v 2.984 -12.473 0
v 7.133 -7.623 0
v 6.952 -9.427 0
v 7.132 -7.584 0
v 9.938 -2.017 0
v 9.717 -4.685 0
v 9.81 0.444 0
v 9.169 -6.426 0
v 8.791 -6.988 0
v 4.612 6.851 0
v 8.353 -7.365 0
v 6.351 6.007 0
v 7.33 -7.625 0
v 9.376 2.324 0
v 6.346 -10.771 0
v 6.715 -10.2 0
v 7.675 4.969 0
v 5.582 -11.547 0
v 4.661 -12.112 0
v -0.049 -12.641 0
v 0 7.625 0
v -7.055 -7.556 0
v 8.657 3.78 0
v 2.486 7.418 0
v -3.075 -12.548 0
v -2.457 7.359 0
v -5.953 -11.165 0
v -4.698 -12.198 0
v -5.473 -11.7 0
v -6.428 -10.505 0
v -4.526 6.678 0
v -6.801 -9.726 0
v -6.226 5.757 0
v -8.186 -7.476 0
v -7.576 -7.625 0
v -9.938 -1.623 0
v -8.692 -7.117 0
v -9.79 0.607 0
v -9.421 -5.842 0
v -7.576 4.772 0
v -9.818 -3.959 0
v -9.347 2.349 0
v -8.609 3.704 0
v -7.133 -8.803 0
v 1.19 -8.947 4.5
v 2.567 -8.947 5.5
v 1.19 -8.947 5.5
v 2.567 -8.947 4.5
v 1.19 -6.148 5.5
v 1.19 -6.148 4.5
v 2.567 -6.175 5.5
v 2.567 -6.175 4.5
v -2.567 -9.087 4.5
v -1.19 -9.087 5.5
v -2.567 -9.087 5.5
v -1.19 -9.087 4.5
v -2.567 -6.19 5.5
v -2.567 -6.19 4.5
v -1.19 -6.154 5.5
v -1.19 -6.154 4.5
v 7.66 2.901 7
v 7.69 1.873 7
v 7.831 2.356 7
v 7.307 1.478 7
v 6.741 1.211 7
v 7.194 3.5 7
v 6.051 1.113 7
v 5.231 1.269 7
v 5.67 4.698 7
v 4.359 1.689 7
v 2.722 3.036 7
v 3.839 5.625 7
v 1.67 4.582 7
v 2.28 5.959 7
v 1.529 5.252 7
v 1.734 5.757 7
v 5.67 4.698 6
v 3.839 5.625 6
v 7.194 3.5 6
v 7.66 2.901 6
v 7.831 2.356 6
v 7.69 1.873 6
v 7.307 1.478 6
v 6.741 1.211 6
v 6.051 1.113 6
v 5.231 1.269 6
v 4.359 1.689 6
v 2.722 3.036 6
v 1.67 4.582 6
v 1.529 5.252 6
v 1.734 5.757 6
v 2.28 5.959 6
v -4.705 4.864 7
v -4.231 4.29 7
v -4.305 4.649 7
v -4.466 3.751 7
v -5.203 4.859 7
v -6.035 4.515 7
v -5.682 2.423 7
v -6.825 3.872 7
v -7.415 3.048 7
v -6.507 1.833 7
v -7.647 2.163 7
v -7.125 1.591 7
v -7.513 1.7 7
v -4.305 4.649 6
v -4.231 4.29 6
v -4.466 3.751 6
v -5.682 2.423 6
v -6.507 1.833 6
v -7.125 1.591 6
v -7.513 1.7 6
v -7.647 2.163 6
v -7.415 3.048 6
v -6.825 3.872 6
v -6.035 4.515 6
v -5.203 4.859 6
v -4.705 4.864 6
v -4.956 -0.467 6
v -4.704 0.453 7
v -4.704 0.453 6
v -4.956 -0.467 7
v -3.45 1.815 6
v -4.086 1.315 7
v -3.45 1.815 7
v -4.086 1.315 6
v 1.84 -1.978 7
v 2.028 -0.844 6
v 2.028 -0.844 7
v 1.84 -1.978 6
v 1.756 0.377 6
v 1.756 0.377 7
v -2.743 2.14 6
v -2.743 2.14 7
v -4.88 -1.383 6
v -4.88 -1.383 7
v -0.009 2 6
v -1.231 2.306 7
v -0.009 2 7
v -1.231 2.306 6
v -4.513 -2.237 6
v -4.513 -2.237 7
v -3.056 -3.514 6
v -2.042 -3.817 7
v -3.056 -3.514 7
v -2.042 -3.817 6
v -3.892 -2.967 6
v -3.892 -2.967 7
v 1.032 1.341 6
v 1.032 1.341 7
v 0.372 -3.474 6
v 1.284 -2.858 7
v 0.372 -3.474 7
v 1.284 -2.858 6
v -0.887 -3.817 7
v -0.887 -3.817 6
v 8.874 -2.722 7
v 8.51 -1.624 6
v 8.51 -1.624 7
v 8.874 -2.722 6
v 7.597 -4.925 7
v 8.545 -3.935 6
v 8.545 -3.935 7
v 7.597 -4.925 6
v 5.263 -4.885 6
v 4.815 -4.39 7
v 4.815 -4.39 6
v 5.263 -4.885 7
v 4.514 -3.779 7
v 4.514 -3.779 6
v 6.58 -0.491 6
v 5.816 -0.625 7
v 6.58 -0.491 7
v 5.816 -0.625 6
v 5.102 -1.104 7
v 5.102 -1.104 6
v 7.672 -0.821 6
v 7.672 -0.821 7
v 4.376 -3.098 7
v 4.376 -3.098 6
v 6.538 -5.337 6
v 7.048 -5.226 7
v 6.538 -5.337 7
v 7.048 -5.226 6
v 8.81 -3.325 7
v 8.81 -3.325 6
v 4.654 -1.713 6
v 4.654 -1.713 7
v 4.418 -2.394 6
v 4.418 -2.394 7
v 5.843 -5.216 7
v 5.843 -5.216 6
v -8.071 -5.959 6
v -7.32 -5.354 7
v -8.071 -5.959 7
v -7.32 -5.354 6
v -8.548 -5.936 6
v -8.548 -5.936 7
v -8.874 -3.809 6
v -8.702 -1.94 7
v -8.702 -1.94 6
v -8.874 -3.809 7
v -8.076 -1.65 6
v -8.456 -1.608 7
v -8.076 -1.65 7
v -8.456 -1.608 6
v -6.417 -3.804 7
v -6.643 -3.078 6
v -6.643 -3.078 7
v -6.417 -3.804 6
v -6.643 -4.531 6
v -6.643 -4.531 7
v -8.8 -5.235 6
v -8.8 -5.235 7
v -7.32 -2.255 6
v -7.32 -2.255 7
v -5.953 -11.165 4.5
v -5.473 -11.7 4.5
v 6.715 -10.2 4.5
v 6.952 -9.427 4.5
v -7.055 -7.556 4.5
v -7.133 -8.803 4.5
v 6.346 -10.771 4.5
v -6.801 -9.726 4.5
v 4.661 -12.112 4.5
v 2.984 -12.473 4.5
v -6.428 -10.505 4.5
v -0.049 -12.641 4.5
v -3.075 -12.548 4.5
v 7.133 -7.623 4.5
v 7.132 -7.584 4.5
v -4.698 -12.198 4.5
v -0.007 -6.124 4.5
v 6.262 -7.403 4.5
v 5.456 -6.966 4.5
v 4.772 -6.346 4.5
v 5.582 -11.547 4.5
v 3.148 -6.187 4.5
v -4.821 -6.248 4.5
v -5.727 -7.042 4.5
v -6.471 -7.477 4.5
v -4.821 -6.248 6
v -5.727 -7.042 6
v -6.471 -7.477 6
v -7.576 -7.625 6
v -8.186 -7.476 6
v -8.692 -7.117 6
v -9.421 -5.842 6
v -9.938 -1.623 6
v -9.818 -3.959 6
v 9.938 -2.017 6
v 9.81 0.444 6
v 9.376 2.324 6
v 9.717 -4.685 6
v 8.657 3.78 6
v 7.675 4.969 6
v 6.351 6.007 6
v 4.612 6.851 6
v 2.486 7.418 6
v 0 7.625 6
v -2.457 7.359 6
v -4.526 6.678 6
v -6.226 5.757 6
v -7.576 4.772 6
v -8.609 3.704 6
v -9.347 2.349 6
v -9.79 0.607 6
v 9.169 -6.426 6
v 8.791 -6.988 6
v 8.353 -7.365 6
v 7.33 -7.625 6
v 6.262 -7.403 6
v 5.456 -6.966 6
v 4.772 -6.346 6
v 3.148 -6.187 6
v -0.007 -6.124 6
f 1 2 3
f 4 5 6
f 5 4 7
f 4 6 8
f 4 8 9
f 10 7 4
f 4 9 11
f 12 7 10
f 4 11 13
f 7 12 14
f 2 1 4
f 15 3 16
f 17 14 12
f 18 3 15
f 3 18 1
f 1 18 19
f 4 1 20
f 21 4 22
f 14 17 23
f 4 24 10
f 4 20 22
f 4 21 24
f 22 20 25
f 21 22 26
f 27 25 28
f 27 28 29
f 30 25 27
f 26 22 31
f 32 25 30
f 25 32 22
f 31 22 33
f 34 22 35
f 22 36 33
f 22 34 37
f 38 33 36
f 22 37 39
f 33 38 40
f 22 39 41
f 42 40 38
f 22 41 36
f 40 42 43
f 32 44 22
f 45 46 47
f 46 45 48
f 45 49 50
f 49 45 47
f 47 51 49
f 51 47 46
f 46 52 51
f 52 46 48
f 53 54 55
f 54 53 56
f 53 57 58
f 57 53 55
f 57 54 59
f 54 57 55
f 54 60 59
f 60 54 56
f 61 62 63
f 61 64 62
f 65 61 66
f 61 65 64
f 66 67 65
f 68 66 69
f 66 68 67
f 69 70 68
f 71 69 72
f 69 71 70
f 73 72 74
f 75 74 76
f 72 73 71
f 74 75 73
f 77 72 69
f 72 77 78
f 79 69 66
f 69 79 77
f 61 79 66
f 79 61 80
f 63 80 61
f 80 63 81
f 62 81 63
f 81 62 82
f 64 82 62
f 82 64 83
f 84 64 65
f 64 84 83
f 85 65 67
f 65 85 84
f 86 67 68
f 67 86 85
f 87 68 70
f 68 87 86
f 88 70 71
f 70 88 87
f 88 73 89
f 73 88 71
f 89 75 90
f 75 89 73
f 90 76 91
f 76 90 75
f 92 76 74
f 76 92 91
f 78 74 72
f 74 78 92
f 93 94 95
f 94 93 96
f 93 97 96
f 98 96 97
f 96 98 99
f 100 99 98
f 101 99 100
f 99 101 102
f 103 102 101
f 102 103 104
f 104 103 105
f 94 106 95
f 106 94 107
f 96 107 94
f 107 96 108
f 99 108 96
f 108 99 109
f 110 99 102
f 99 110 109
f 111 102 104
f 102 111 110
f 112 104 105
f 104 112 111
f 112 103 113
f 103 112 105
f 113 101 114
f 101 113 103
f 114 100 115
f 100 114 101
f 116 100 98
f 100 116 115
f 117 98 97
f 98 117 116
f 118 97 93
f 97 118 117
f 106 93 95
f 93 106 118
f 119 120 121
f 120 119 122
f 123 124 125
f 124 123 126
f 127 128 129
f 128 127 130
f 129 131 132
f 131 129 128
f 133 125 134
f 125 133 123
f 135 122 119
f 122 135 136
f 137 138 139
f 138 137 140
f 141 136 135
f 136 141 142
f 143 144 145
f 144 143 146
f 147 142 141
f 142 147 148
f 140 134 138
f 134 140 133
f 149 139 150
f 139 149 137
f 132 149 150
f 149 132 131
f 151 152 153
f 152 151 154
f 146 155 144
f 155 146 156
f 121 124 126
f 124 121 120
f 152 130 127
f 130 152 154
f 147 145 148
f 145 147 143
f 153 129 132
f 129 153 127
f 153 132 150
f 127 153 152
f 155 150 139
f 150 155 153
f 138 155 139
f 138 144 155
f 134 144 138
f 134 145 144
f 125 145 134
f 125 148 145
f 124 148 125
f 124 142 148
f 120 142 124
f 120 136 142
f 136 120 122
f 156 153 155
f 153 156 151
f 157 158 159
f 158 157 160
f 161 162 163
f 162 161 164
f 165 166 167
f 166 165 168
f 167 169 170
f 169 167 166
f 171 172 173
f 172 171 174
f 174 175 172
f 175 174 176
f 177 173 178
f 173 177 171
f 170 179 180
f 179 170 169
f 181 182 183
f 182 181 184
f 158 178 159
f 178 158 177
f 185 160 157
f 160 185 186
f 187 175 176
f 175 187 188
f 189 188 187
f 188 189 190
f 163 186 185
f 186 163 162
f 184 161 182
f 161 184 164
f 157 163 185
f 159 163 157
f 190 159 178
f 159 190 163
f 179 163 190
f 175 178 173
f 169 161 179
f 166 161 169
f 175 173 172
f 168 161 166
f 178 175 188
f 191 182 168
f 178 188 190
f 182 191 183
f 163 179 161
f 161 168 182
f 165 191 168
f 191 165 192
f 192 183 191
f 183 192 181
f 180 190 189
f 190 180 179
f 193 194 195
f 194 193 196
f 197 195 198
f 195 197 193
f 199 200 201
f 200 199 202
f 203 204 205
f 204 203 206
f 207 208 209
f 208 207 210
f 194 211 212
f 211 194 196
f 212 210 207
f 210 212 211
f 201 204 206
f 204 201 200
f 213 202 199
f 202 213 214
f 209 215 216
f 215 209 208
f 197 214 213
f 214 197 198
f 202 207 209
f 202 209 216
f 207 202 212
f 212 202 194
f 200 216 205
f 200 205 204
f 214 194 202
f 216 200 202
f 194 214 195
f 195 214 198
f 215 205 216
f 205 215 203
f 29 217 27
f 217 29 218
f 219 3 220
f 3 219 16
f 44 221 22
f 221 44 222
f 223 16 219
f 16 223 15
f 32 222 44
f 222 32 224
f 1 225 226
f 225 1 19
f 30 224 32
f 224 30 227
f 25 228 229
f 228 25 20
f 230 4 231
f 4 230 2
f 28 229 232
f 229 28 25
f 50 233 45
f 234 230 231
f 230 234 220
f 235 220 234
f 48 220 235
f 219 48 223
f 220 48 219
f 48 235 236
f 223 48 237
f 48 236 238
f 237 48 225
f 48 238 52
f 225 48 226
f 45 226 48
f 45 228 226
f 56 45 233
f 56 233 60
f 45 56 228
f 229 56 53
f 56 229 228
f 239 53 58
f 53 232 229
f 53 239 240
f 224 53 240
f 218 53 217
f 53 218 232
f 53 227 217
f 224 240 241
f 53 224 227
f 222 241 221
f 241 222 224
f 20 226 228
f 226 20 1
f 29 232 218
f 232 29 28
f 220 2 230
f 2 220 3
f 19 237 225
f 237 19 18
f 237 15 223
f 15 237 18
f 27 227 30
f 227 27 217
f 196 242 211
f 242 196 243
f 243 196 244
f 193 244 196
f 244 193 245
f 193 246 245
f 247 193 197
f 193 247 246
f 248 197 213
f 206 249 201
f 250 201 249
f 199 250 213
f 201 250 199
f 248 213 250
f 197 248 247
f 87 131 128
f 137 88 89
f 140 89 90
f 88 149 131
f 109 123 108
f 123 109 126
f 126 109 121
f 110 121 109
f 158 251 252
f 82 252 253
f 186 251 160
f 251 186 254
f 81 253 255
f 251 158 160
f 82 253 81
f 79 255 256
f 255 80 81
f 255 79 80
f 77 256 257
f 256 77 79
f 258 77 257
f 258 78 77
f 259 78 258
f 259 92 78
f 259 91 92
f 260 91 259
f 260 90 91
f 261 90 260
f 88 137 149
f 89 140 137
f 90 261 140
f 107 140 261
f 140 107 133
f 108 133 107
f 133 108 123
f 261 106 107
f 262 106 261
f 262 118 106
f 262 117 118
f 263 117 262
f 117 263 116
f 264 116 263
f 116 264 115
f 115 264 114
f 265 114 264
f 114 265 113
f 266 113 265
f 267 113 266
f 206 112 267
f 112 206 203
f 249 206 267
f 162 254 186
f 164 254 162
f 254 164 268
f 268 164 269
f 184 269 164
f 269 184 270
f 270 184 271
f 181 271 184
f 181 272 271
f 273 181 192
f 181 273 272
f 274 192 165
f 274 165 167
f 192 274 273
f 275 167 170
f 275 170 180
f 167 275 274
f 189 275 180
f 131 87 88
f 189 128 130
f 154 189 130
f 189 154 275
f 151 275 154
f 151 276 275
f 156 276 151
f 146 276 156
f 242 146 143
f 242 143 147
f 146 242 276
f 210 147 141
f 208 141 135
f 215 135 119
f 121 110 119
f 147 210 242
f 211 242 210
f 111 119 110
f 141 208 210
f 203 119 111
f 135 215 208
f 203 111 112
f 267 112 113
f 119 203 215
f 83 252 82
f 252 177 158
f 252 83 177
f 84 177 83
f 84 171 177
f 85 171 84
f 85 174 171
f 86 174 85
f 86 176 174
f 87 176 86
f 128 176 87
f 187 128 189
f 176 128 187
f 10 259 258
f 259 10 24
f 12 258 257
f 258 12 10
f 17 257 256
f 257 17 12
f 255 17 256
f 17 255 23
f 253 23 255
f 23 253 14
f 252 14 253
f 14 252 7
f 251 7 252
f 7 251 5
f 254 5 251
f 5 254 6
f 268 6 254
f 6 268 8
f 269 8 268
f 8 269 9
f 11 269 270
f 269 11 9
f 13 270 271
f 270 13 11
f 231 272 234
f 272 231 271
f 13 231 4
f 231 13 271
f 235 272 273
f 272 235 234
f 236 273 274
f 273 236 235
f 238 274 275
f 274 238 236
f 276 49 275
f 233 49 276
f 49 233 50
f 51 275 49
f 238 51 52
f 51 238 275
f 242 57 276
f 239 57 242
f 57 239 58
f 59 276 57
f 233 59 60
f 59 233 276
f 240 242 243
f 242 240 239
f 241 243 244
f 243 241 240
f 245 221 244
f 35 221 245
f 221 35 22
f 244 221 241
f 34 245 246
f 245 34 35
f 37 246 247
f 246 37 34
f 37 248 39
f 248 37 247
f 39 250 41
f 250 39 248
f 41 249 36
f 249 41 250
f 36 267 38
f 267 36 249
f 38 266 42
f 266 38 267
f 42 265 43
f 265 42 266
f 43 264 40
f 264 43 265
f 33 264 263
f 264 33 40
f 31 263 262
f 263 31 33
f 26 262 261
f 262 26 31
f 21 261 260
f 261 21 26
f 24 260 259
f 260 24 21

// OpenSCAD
// file: mushroom03.scad
// Module names are of the form poly_<inkscape-path-id>().  As a result,
// you can associate a polygon in this OpenSCAD program with the corresponding
// SVG element in the Inkscape document by looking for the XML element with
// the attribute id="inkscape-path-id".

// fudge value is used to ensure that subtracted solids are a tad taller
// in the z dimension than the polygon being subtracted from.  This helps
// keep the resulting .stl file manifold.
fudge = 0.1;

module poly_path41505(h)
{
  scale([25.4/90, -25.4/90, 1]) union()
  {
    linear_extrude(height=h)
      polygon([[8.077628,-21.114641],[6.143303,-20.400503],[5.417864,-18.609448],[5.916279,-16.236432],[9.644076,-10.756421],[15.445503,-5.984284],[18.535957,-4.496110],[21.439372,-3.943836],[23.886177,-4.290913],[25.892521,-5.236402],[27.249514,-6.636684],[27.748265,-8.348144],[27.141367,-10.279882],[25.491841,-12.402075],[20.091915,-16.644962],[13.602505,-19.931083],[8.077628,-21.114717]]);
    linear_extrude(height=h)
      polygon([[-18.437542,-17.216230],[-21.383785,-15.997024],[-24.183592,-13.718734],[-26.275336,-10.801038],[-27.097390,-7.663612],[-26.620230,-6.022064],[-25.244665,-5.636264],[-23.054568,-6.494782],[-20.133812,-8.586185],[-15.825208,-13.290351],[-14.991698,-15.201932],[-15.253346,-16.472306],[-16.670576,-17.233124],[-18.437542,-17.216307]]);
    linear_extrude(height=h)
      polygon([[-4.361586,-8.169526],[-9.718830,-7.582711],[-12.224646,-6.430887],[-14.479618,-4.657973],[-16.668301,-1.604160],[-17.560941,1.653078],[-17.290422,4.900461],[-15.989631,7.924708],[-13.791455,10.512539],[-10.828780,12.450672],[-7.234491,13.525827],[-3.141474,13.524723],[1.316706,12.310193],[4.550306,10.126187],[6.519599,7.007783],[7.184858,2.990062],[6.222002,-1.336842],[3.655038,-4.751319],[-0.033627,-7.085002],[-4.361586,-8.169526]]);
    linear_extrude(height=h)
      polygon([[23.314184,1.740191],[20.609181,2.215836],[18.076619,3.912589],[16.491320,6.071431],[15.653685,8.481308],[15.507224,10.976125],[15.995447,13.389791],[17.061866,15.556213],[18.649990,17.309295],[20.703331,18.482947],[23.165398,18.911073],[24.974589,18.518892],[26.919640,17.451113],[30.277763,13.941336],[31.215131,11.782236],[31.442186,9.645178],[30.152942,5.755363],[27.185214,2.908249],[23.314184,1.740191]]);
    linear_extrude(height=h)
      polygon([[-28.615089,5.846916],[-29.960749,5.696102],[-30.832127,6.874800],[-31.442186,13.494950],[-31.181903,18.550094],[-30.289316,21.032284],[-28.596815,21.114717],[-25.936792,18.970587],[-23.537035,16.054923],[-22.737116,13.480072],[-23.537035,10.905222],[-25.936792,7.989557],[-28.615089,5.846916]]);
  }
}

poly_path41505(7);
// file: mushroom02.scad
// Module names are of the form poly_<inkscape-path-id>().  As a result,
// you can associate a polygon in this OpenSCAD program with the corresponding
// SVG element in the Inkscape document by looking for the XML element with
// the attribute id="inkscape-path-id".

// fudge value is used to ensure that subtracted solids are a tad taller
// in the z dimension than the polygon being subtracted from.  This helps
// keep the resulting .stl file manifold.
fudge = 0.1;

module poly_path4166(h)
{
  scale([25.4/90, -25.4/90, 1]) union()
  {
    linear_extrude(height=h)
      polygon([[-17.083011,22.138203],[-0.024245,21.698572],[11.155627,21.922933],[16.908705,22.486815],[19.333997,24.682706],[22.186537,26.231884],[25.973161,27.019050],[29.598404,26.095714],[31.148527,24.760762],[32.488243,22.770083],[34.430236,16.600916],[35.211937,7.146972],[34.759421,-1.573925],[33.221483,-8.236127],[30.674133,-13.395019],[27.193380,-17.605984],[22.503179,-21.282969],[16.342179,-24.273584],[8.808435,-26.283669],[0.000001,-27.019067],[-8.704932,-26.076669],[-16.037121,-23.663478],[-22.061934,-20.400493],[-26.844737,-16.908714],[-30.505387,-13.122766],[-33.120137,-8.323610],[-34.688987,-2.151716],[-35.211937,5.752448],[-34.787041,14.027035],[-33.381613,20.700092],[-30.799548,25.215981],[-29.005993,26.491352],[-26.844737,27.019067],[-22.928360,26.494132],[-20.294129,24.951043],[-17.083011,22.138203]]);
  }
}

poly_path4166(6);
// file: mushroom01.scad
// Module names are of the form poly_<inkscape-path-id>().  As a result,
// you can associate a polygon in this OpenSCAD program with the corresponding
// SVG element in the Inkscape document by looking for the XML element with
// the attribute id="inkscape-path-id".

// fudge value is used to ensure that subtracted solids are a tad taller
// in the z dimension than the polygon being subtracted from.  This helps
// keep the resulting .stl file manifold.
fudge = 0.1;

module poly_rect41706(h)
{
  scale([25.4/90, -25.4/90, 1]) union()
  {
    linear_extrude(height=h)
      polygon([[4.215628,-7.393497],[9.096489,-7.393497],[9.096489,6.900456],[4.215628,6.900456]]);
  }
}

module poly_rect41703(h)
{
  scale([25.4/90, -25.4/90, 1]) union()
  {
    linear_extrude(height=h)
      polygon([[-9.096489,-6.900456],[-4.215628,-6.900456],[-4.215628,7.393497],[-9.096489,7.393497]]);
  }
}

height = 5.5;
poly_rect41706(height);
poly_rect41703(height);
// file: mushroom00.scad
// Module names are of the form poly_<inkscape-path-id>().  As a result,
// you can associate a polygon in this OpenSCAD program with the corresponding
// SVG element in the Inkscape document by looking for the XML element with
// the attribute id="inkscape-path-id".

// fudge value is used to ensure that subtracted solids are a tad taller
// in the z dimension than the polygon being subtracted from.  This helps
// keep the resulting .stl file manifold.
fudge = 0.1;

module poly_path4168(h)
{
  scale([25.4/90, -25.4/90, 1]) union()
  {
    linear_extrude(height=h)
      polygon([[-24.578670,-11.853522],[-25.275895,-0.697255],[-24.099263,2.571179],[-22.775549,5.333003],[-21.092304,7.669930],[-19.392711,9.565625],[-16.647223,11.330580],[-10.894776,12.572582],[-0.174310,12.899420],[10.573386,12.305658],[16.516487,11.025523],[19.779476,9.026333],[22.486835,6.275403],[23.792846,4.250332],[24.633105,1.514378],[25.275894,-4.880861],[24.927259,-12.899420]]);
  }
}

poly_path4168(4.5);
// main file
module face(){
    include <mushroom00.scad>;
}
module eyes(){
    include <mushroom01.scad>;
}
module cap(){
    include <mushroom02.scad>;
}
module spots(){
    include <mushroom03.scad>;
}

translate([0,-9,0]) face();
translate([0,-7,0]) eyes();
cap();
spots();
